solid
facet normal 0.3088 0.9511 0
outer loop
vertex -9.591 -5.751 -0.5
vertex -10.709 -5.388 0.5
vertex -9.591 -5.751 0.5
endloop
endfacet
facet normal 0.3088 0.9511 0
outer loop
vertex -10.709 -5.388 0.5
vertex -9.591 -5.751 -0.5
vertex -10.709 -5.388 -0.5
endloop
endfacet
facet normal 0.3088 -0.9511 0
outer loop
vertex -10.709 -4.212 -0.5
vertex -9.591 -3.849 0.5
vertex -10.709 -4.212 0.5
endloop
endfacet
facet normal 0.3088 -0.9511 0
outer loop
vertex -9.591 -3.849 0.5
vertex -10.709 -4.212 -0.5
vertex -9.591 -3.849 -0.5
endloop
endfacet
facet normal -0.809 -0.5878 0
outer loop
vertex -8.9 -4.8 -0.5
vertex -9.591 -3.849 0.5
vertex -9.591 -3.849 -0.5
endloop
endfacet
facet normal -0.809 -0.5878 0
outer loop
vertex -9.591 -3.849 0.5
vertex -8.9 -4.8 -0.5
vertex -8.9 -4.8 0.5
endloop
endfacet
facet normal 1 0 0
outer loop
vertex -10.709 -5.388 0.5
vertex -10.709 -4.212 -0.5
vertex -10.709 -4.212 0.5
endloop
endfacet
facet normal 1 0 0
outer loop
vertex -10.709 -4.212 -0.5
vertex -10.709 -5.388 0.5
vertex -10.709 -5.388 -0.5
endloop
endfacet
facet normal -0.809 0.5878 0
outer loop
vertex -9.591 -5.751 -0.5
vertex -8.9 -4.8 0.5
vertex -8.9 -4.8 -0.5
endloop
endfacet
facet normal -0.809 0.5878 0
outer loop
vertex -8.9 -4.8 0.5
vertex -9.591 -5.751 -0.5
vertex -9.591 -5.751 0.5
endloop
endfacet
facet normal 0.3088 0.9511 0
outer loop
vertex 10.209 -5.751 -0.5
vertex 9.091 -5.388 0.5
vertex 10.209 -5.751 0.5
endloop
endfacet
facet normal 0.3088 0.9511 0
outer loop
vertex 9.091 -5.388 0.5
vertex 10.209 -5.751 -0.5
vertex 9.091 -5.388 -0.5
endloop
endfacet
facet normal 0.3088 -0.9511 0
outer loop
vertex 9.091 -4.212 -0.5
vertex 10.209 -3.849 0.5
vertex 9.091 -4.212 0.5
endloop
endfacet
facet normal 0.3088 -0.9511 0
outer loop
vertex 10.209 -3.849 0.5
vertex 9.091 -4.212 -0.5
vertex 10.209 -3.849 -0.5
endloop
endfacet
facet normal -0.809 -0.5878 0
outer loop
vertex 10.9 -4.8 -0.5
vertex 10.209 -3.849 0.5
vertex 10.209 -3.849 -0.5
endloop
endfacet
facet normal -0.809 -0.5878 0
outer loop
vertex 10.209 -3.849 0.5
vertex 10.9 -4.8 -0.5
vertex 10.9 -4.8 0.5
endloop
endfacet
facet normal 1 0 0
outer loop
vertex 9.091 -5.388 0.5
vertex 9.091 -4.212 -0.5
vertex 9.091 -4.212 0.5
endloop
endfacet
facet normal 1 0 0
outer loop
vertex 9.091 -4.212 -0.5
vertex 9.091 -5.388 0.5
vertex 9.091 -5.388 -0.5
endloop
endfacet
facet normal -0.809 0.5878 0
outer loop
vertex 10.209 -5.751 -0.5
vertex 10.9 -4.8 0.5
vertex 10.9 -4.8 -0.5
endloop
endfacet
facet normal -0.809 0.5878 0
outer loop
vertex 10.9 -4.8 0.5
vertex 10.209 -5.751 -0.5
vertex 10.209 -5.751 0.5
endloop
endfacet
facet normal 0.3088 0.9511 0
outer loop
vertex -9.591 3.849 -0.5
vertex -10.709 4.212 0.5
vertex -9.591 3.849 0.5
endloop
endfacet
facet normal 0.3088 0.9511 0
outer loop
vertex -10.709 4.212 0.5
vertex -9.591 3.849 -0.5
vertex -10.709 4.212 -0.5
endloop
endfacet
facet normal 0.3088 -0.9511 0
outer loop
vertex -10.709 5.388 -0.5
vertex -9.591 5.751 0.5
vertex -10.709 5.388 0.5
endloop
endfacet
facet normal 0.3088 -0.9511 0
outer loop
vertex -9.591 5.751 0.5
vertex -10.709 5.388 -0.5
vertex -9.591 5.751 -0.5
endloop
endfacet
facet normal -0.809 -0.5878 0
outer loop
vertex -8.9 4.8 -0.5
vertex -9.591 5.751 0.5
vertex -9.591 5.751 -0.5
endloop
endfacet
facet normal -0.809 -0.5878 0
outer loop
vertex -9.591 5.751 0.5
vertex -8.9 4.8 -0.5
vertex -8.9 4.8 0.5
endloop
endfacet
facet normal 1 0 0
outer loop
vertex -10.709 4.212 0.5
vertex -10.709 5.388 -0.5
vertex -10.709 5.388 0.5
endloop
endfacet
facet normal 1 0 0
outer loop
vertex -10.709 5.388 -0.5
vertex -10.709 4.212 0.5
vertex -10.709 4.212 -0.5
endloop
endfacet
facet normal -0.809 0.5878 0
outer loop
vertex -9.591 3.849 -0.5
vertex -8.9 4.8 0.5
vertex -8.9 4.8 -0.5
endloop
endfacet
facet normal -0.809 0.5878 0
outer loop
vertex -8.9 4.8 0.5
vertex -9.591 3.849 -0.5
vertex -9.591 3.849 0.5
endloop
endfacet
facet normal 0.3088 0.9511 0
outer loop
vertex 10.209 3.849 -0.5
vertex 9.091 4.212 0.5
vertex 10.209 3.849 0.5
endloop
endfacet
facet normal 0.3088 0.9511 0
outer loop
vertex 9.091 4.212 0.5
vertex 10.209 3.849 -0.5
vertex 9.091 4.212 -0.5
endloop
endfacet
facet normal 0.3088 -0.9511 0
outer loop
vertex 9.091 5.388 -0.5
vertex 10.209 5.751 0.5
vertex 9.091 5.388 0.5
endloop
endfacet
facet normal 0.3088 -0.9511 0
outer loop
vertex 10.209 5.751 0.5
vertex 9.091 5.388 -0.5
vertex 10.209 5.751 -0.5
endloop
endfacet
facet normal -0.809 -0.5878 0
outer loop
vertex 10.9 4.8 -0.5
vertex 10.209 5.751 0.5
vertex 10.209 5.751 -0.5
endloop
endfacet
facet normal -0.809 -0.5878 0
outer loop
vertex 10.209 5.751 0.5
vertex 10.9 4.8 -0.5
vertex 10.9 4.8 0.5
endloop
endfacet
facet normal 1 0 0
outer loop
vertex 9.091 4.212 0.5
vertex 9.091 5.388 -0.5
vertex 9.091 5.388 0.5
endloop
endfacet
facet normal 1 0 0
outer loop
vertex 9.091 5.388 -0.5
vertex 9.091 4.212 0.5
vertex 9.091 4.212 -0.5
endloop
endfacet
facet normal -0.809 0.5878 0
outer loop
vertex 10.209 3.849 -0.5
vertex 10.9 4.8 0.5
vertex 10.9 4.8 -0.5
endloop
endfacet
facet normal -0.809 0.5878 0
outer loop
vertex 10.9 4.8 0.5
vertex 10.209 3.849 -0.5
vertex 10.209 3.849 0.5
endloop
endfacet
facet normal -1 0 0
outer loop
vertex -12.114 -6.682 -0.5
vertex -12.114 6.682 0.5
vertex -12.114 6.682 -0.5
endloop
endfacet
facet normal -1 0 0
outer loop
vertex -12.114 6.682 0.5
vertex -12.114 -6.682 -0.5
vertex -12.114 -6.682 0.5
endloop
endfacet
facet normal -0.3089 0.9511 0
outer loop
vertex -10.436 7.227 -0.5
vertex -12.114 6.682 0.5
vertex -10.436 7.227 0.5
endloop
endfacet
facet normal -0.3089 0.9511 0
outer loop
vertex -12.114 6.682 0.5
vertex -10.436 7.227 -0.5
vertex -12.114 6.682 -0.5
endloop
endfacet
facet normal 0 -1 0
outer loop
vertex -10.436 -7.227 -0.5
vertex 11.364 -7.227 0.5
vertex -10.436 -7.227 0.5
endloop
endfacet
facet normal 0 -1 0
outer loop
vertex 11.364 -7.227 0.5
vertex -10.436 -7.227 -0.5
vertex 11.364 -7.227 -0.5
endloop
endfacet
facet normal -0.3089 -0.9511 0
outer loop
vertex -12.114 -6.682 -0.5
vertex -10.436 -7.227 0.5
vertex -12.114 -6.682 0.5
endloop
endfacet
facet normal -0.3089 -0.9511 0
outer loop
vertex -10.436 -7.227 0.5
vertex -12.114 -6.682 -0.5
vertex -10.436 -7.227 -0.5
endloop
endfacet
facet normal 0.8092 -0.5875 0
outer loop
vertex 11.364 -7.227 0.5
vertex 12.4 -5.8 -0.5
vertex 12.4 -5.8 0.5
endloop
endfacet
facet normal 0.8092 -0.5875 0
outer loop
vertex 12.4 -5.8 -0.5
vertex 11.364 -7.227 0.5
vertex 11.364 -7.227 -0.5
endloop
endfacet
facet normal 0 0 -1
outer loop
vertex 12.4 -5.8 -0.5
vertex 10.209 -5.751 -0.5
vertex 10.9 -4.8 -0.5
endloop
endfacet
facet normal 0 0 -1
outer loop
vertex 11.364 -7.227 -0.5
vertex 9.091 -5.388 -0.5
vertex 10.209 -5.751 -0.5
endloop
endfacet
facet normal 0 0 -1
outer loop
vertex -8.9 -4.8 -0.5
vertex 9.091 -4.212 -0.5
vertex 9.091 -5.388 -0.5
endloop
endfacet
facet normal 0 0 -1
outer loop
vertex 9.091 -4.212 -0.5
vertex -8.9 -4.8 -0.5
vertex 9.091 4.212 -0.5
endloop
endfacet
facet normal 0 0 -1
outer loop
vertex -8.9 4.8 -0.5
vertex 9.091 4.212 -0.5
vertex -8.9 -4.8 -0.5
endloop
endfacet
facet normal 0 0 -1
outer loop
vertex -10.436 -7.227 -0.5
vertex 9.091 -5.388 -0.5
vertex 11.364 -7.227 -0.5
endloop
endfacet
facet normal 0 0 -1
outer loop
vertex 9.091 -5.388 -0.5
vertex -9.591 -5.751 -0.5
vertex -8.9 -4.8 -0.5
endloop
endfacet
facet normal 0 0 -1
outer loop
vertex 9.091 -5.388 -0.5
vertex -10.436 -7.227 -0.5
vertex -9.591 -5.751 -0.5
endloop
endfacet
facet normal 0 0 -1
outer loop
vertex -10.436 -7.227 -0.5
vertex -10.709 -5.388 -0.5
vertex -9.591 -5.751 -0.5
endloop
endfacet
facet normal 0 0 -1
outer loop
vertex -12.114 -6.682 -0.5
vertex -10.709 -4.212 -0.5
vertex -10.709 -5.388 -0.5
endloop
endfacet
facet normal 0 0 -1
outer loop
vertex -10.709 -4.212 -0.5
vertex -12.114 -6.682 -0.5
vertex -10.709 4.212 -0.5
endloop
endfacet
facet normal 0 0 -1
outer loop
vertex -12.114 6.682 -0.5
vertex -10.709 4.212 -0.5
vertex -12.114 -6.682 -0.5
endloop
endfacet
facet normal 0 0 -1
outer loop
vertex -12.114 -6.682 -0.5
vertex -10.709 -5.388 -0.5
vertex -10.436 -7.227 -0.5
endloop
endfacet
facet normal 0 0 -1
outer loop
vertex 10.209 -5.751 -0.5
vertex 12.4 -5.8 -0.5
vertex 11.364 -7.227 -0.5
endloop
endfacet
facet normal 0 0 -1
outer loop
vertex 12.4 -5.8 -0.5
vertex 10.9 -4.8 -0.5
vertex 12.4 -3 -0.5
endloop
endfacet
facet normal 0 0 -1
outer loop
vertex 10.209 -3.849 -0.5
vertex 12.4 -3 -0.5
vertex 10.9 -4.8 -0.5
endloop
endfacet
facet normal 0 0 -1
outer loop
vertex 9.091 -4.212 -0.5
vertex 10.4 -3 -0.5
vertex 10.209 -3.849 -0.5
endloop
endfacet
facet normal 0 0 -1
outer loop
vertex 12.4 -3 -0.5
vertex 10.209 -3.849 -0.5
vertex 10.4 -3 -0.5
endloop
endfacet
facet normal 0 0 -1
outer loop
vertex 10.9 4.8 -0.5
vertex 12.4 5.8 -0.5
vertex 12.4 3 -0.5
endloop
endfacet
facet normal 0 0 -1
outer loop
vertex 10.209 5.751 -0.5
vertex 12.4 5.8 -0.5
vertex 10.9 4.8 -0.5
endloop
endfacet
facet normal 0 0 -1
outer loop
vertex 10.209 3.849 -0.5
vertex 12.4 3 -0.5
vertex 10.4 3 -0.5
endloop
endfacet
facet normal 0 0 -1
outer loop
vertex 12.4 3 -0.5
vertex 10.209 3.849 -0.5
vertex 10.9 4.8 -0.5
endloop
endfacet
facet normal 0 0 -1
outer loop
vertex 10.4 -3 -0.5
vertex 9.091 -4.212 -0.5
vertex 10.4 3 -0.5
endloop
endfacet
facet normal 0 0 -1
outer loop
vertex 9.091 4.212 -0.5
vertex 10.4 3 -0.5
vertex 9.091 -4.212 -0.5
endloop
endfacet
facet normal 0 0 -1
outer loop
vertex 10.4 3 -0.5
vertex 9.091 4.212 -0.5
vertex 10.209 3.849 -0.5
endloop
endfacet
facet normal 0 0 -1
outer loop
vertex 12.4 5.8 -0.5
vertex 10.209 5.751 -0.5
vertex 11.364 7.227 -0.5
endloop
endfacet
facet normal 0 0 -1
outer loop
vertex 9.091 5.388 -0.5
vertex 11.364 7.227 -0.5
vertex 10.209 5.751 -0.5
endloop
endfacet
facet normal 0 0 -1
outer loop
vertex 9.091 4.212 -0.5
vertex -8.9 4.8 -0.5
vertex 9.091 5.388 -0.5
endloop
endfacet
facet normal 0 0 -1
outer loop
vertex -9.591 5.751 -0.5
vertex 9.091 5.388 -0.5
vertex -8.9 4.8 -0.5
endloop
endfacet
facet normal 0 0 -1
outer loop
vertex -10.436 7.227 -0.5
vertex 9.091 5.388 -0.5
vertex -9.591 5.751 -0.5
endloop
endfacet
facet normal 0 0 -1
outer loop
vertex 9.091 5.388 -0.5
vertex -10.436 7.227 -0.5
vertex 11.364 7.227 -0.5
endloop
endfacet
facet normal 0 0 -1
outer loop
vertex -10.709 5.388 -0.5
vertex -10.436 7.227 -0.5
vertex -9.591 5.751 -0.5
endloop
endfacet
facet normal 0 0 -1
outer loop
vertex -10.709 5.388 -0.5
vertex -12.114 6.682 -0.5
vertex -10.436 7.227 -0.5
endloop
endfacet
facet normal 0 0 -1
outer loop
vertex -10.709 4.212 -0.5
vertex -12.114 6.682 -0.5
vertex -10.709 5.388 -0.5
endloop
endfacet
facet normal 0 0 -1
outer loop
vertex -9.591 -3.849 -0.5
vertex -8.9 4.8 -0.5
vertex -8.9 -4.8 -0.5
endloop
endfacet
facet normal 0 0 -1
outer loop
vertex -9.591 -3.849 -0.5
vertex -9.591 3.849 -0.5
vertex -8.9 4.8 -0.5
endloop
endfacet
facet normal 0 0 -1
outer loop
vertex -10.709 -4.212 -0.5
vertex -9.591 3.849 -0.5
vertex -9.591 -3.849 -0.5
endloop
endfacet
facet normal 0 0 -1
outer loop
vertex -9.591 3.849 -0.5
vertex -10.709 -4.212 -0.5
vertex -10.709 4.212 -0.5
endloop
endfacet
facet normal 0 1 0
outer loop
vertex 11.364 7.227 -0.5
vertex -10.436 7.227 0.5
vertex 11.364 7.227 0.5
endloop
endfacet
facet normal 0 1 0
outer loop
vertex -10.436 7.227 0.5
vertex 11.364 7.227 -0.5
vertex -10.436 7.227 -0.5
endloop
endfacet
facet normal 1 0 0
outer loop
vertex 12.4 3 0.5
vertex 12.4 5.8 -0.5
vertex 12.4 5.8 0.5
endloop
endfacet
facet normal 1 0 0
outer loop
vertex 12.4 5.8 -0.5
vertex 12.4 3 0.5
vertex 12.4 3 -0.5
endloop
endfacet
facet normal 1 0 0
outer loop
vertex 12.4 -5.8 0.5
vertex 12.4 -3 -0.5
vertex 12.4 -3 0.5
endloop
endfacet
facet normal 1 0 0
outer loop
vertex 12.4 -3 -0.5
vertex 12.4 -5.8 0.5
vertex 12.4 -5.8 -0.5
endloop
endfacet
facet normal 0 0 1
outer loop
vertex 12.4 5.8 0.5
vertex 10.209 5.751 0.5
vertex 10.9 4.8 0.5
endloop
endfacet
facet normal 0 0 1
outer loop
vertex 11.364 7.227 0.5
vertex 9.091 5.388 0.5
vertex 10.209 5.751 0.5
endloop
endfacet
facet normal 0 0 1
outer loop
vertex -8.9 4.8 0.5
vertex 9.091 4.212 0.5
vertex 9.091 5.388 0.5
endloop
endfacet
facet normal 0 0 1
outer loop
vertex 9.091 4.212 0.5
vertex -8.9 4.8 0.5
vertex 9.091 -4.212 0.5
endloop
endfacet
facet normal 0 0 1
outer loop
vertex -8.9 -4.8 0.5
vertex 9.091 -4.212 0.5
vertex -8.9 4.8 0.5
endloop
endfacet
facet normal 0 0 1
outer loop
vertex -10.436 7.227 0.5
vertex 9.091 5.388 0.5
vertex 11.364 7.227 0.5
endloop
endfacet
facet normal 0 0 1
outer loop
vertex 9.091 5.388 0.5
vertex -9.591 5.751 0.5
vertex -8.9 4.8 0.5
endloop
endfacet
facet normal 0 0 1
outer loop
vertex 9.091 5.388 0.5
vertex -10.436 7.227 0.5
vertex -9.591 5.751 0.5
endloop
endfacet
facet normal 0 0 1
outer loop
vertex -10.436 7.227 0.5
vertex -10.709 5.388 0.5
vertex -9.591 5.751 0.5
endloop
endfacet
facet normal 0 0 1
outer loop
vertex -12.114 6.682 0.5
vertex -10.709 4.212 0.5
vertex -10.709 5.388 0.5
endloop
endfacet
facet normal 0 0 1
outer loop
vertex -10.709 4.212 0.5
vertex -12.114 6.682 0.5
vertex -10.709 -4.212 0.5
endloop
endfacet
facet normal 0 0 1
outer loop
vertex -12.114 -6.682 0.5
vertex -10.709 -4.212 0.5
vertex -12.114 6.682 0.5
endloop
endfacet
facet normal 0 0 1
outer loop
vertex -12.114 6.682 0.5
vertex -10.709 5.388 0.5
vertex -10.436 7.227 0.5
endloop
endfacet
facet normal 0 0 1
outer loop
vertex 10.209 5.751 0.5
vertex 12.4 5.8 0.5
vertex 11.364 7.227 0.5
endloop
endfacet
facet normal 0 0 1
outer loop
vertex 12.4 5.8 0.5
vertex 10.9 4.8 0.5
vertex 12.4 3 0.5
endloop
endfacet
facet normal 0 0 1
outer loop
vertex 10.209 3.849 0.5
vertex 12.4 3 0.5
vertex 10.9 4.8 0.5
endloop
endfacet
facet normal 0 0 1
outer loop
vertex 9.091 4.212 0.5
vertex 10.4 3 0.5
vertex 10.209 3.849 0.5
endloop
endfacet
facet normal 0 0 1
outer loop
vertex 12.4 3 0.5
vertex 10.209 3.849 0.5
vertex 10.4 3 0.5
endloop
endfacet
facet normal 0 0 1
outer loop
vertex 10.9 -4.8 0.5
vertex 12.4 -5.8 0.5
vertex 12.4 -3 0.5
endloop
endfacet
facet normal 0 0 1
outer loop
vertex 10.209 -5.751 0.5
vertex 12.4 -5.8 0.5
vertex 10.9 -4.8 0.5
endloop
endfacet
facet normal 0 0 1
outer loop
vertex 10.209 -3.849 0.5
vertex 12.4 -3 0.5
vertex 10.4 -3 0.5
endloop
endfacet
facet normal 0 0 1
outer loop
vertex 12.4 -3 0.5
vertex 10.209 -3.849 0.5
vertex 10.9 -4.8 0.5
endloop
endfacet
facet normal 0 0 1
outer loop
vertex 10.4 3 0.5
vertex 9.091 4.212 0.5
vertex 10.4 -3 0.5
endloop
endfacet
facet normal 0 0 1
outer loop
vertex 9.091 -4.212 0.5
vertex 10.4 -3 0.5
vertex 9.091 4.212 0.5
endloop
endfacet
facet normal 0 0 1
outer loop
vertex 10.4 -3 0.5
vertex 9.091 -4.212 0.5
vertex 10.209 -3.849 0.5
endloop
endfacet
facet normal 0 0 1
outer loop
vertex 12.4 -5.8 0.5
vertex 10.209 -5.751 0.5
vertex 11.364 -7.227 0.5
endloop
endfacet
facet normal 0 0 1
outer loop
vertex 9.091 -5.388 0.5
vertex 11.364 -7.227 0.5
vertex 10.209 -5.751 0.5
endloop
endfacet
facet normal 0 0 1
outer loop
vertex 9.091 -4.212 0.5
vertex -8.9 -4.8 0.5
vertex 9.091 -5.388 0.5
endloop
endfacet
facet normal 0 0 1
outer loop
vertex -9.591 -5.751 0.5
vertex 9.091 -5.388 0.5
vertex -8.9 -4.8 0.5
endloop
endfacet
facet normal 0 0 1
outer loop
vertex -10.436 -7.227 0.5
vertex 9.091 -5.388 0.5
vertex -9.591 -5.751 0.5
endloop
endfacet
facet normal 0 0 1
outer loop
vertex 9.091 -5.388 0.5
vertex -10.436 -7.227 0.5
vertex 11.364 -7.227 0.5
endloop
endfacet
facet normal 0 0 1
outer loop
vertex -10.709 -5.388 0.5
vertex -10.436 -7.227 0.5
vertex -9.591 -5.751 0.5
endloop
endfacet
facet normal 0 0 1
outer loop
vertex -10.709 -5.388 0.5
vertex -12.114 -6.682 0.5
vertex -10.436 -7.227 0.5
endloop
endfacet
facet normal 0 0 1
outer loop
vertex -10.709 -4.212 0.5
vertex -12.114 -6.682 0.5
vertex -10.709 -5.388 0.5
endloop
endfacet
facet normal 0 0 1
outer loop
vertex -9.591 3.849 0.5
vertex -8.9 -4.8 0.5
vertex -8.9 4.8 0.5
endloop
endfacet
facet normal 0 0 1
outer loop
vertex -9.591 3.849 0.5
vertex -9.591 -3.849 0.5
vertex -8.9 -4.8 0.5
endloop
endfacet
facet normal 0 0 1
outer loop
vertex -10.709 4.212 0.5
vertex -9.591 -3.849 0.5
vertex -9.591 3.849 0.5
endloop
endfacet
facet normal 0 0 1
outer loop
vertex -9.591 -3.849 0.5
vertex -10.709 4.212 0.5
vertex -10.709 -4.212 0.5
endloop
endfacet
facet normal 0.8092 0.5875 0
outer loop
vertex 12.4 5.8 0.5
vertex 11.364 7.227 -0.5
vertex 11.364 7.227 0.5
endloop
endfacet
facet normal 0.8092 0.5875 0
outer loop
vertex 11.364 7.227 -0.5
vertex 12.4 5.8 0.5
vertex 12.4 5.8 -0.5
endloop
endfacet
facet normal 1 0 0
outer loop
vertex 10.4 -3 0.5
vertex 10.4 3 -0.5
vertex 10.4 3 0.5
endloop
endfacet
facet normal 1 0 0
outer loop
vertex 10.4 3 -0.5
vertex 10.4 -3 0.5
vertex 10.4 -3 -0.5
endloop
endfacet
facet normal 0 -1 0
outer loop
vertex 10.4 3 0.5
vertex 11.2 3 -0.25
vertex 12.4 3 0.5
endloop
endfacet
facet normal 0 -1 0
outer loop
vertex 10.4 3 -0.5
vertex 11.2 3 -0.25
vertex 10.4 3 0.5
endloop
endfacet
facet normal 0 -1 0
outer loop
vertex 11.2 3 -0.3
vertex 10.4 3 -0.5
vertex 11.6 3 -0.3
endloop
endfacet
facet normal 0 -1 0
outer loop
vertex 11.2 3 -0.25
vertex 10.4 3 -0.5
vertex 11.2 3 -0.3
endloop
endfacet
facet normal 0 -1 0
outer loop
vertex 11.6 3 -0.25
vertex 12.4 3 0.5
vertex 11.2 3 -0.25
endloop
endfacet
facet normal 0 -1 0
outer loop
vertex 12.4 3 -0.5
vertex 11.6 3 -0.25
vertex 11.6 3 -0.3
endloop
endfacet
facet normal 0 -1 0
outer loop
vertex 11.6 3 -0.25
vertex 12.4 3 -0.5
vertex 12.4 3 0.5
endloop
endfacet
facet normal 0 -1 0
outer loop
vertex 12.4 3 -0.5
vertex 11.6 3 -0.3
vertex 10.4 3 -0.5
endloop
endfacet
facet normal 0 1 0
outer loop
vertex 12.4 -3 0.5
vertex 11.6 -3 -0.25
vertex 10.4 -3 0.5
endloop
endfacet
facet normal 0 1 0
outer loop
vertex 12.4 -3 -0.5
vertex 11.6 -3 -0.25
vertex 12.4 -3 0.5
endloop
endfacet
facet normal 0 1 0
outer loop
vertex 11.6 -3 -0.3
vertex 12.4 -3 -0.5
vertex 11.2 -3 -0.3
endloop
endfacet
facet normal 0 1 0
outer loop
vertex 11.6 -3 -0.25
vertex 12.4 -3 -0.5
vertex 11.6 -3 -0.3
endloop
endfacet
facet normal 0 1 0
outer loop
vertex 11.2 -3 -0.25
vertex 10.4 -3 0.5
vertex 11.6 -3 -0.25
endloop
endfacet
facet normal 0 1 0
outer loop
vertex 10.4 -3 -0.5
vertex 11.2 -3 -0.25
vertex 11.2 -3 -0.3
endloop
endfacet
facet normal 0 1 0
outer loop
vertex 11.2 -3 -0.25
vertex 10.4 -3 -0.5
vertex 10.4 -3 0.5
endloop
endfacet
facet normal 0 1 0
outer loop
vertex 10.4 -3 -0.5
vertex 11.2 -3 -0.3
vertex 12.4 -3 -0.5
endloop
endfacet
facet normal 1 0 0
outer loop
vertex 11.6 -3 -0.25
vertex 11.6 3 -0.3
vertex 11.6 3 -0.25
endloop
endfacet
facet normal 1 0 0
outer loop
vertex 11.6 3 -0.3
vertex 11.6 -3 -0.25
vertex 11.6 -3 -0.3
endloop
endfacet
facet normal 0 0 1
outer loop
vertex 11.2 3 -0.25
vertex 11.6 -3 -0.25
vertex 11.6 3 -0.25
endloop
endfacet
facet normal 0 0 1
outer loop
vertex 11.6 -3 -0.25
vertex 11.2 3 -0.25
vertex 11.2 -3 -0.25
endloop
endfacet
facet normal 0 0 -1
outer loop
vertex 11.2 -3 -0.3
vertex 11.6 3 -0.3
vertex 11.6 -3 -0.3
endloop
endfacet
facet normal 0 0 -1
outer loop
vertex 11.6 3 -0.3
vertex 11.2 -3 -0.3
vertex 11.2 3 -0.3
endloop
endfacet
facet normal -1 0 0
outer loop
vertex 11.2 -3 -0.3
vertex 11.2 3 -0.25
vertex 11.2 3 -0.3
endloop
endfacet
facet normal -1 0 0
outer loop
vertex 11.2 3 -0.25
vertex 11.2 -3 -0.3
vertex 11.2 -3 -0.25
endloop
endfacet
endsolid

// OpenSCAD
// Parameters
pcb_L = 24.8; //[12.4:49.6:0.1]
pcb_W = 14.6; //[7.3:29.2:0.1]
pcb_T = 1.0; //[0.5:2.0:0.1]
corner_R = 1.5; //[0.5:3.0:0.1]
mount_hole_D = 2.0; //[1.0:4.0:0.1]
mount_edge_offset = 2.5; //[1.0:5.0:0.1]
hole_clearance_Z = 0.2; //[0.1:1.0:0.1]
silk_T = 0.05; //[0.02:0.2:0.01]
silk_margin = 0.8; //[0.3:2.0:0.1]
copper_T = 0.035; //[0.01:0.1:0.005]
pad_D = 1.6; //[0.8:3.2:0.1]
pad_pitch = 2.54; //[1.27:5.08:0.01]
trace_W = 0.4; //[0.2:1.0:0.05]
trace_L = 10.0; //[5.0:20.0:0.5]
edge_cutout_W = 6.0; //[2.0:12.0:0.5]
edge_cutout_D = 2.0; //[0.5:5.0:0.1]
connect_overlap = 0.8; //[0.5:2.0:0.1]

// Base Shapes
module pcb_corner_cyl(pos) {
  translate(pos)
    cylinder(r=corner_R, h=pcb_T, center=true);
}

module mount_hole(pos) {
  translate(pos)
    cylinder(r=mount_hole_D/2, h=pcb_T + hole_clearance_Z, center=true);
}

module edge_connector_cutout(pos) {
  translate(pos)
    cube([edge_cutout_D, edge_cutout_W, pcb_T + hole_clearance_Z], center=true);
}

module silk_border_outer() {
  translate([0, 0, pcb_T/2 + silk_T/2 - connect_overlap])
    cube([pcb_L - 2*silk_margin, pcb_W - 2*silk_margin, silk_T], center=true);
}

module silk_border_inner_cut() {
  translate([0, 0, pcb_T/2 + silk_T/2 - connect_overlap])
    cube([pcb_L - 2*(silk_margin + trace_W), pcb_W - 2*(silk_margin + trace_W), silk_T + hole_clearance_Z], center=true);
}

module copper_pad(pos) {
  translate(pos)
    cylinder(r=pad_D/2, h=copper_T, center=true);
}

module copper_trace() {
  translate([-pcb_L/2 + mount_edge_offset + 2*pad_pitch + trace_L/2 - connect_overlap, 0, pcb_T/2 + copper_T/2 - connect_overlap])
    cube([trace_L, trace_W, copper_T], center=true);
}

// Operations
module rounded_corners() {
  hull() {
    pcb_corner_cyl([pcb_L/2 - corner_R, pcb_W/2 - corner_R, 0]);
    pcb_corner_cyl([-pcb_L/2 + corner_R, pcb_W/2 - corner_R, 0]);
    pcb_corner_cyl([-pcb_L/2 + corner_R, -pcb_W/2 + corner_R, 0]);
    pcb_corner_cyl([pcb_L/2 - corner_R, -pcb_W/2 + corner_R, 0]);
  }
}

module mounting_holes() {
  union() {
    mount_hole([-pcb_L/2 + mount_edge_offset, -pcb_W/2 + mount_edge_offset, 0]);
    mount_hole([pcb_L/2 - mount_edge_offset, -pcb_W/2 + mount_edge_offset, 0]);
    mount_hole([-pcb_L/2 + mount_edge_offset, pcb_W/2 - mount_edge_offset, 0]);
    mount_hole([pcb_L/2 - mount_edge_offset, pcb_W/2 - mount_edge_offset, 0]);
  }
}

module edge_connector_cutouts() {
  edge_connector_cutout([pcb_L/2 - edge_cutout_D/2, 0, 0]);
}

module pcb_body() {
  difference() {
    rounded_corners();
    mounting_holes();
    edge_connector_cutouts();
  }
}

module silkscreen_markings() {
  difference() {
    silk_border_outer();
    silk_border_inner_cut();
  }
}

module copper_pads_traces() {
  union() {
    copper_pad([-pcb_L/2 + mount_edge_offset + pad_pitch, 0, pcb_T/2 + copper_T/2 - connect_overlap]);
    copper_pad([-pcb_L/2 + mount_edge_offset + 2*pad_pitch, 0, pcb_T/2 + copper_T/2 - connect_overlap]);
    copper_pad([-pcb_L/2 + mount_edge_offset + 3*pad_pitch, 0, pcb_T/2 + copper_T/2 - connect_overlap]);
    copper_trace();
  }
}

// Final Output
module pcb_complete() {
  union() {
    pcb_body();
    silkscreen_markings();
    copper_pads_traces();
  }
}

// Render the PCB
color([0.0, 0.4, 0.2]) pcb_complete(); // PCB in green
